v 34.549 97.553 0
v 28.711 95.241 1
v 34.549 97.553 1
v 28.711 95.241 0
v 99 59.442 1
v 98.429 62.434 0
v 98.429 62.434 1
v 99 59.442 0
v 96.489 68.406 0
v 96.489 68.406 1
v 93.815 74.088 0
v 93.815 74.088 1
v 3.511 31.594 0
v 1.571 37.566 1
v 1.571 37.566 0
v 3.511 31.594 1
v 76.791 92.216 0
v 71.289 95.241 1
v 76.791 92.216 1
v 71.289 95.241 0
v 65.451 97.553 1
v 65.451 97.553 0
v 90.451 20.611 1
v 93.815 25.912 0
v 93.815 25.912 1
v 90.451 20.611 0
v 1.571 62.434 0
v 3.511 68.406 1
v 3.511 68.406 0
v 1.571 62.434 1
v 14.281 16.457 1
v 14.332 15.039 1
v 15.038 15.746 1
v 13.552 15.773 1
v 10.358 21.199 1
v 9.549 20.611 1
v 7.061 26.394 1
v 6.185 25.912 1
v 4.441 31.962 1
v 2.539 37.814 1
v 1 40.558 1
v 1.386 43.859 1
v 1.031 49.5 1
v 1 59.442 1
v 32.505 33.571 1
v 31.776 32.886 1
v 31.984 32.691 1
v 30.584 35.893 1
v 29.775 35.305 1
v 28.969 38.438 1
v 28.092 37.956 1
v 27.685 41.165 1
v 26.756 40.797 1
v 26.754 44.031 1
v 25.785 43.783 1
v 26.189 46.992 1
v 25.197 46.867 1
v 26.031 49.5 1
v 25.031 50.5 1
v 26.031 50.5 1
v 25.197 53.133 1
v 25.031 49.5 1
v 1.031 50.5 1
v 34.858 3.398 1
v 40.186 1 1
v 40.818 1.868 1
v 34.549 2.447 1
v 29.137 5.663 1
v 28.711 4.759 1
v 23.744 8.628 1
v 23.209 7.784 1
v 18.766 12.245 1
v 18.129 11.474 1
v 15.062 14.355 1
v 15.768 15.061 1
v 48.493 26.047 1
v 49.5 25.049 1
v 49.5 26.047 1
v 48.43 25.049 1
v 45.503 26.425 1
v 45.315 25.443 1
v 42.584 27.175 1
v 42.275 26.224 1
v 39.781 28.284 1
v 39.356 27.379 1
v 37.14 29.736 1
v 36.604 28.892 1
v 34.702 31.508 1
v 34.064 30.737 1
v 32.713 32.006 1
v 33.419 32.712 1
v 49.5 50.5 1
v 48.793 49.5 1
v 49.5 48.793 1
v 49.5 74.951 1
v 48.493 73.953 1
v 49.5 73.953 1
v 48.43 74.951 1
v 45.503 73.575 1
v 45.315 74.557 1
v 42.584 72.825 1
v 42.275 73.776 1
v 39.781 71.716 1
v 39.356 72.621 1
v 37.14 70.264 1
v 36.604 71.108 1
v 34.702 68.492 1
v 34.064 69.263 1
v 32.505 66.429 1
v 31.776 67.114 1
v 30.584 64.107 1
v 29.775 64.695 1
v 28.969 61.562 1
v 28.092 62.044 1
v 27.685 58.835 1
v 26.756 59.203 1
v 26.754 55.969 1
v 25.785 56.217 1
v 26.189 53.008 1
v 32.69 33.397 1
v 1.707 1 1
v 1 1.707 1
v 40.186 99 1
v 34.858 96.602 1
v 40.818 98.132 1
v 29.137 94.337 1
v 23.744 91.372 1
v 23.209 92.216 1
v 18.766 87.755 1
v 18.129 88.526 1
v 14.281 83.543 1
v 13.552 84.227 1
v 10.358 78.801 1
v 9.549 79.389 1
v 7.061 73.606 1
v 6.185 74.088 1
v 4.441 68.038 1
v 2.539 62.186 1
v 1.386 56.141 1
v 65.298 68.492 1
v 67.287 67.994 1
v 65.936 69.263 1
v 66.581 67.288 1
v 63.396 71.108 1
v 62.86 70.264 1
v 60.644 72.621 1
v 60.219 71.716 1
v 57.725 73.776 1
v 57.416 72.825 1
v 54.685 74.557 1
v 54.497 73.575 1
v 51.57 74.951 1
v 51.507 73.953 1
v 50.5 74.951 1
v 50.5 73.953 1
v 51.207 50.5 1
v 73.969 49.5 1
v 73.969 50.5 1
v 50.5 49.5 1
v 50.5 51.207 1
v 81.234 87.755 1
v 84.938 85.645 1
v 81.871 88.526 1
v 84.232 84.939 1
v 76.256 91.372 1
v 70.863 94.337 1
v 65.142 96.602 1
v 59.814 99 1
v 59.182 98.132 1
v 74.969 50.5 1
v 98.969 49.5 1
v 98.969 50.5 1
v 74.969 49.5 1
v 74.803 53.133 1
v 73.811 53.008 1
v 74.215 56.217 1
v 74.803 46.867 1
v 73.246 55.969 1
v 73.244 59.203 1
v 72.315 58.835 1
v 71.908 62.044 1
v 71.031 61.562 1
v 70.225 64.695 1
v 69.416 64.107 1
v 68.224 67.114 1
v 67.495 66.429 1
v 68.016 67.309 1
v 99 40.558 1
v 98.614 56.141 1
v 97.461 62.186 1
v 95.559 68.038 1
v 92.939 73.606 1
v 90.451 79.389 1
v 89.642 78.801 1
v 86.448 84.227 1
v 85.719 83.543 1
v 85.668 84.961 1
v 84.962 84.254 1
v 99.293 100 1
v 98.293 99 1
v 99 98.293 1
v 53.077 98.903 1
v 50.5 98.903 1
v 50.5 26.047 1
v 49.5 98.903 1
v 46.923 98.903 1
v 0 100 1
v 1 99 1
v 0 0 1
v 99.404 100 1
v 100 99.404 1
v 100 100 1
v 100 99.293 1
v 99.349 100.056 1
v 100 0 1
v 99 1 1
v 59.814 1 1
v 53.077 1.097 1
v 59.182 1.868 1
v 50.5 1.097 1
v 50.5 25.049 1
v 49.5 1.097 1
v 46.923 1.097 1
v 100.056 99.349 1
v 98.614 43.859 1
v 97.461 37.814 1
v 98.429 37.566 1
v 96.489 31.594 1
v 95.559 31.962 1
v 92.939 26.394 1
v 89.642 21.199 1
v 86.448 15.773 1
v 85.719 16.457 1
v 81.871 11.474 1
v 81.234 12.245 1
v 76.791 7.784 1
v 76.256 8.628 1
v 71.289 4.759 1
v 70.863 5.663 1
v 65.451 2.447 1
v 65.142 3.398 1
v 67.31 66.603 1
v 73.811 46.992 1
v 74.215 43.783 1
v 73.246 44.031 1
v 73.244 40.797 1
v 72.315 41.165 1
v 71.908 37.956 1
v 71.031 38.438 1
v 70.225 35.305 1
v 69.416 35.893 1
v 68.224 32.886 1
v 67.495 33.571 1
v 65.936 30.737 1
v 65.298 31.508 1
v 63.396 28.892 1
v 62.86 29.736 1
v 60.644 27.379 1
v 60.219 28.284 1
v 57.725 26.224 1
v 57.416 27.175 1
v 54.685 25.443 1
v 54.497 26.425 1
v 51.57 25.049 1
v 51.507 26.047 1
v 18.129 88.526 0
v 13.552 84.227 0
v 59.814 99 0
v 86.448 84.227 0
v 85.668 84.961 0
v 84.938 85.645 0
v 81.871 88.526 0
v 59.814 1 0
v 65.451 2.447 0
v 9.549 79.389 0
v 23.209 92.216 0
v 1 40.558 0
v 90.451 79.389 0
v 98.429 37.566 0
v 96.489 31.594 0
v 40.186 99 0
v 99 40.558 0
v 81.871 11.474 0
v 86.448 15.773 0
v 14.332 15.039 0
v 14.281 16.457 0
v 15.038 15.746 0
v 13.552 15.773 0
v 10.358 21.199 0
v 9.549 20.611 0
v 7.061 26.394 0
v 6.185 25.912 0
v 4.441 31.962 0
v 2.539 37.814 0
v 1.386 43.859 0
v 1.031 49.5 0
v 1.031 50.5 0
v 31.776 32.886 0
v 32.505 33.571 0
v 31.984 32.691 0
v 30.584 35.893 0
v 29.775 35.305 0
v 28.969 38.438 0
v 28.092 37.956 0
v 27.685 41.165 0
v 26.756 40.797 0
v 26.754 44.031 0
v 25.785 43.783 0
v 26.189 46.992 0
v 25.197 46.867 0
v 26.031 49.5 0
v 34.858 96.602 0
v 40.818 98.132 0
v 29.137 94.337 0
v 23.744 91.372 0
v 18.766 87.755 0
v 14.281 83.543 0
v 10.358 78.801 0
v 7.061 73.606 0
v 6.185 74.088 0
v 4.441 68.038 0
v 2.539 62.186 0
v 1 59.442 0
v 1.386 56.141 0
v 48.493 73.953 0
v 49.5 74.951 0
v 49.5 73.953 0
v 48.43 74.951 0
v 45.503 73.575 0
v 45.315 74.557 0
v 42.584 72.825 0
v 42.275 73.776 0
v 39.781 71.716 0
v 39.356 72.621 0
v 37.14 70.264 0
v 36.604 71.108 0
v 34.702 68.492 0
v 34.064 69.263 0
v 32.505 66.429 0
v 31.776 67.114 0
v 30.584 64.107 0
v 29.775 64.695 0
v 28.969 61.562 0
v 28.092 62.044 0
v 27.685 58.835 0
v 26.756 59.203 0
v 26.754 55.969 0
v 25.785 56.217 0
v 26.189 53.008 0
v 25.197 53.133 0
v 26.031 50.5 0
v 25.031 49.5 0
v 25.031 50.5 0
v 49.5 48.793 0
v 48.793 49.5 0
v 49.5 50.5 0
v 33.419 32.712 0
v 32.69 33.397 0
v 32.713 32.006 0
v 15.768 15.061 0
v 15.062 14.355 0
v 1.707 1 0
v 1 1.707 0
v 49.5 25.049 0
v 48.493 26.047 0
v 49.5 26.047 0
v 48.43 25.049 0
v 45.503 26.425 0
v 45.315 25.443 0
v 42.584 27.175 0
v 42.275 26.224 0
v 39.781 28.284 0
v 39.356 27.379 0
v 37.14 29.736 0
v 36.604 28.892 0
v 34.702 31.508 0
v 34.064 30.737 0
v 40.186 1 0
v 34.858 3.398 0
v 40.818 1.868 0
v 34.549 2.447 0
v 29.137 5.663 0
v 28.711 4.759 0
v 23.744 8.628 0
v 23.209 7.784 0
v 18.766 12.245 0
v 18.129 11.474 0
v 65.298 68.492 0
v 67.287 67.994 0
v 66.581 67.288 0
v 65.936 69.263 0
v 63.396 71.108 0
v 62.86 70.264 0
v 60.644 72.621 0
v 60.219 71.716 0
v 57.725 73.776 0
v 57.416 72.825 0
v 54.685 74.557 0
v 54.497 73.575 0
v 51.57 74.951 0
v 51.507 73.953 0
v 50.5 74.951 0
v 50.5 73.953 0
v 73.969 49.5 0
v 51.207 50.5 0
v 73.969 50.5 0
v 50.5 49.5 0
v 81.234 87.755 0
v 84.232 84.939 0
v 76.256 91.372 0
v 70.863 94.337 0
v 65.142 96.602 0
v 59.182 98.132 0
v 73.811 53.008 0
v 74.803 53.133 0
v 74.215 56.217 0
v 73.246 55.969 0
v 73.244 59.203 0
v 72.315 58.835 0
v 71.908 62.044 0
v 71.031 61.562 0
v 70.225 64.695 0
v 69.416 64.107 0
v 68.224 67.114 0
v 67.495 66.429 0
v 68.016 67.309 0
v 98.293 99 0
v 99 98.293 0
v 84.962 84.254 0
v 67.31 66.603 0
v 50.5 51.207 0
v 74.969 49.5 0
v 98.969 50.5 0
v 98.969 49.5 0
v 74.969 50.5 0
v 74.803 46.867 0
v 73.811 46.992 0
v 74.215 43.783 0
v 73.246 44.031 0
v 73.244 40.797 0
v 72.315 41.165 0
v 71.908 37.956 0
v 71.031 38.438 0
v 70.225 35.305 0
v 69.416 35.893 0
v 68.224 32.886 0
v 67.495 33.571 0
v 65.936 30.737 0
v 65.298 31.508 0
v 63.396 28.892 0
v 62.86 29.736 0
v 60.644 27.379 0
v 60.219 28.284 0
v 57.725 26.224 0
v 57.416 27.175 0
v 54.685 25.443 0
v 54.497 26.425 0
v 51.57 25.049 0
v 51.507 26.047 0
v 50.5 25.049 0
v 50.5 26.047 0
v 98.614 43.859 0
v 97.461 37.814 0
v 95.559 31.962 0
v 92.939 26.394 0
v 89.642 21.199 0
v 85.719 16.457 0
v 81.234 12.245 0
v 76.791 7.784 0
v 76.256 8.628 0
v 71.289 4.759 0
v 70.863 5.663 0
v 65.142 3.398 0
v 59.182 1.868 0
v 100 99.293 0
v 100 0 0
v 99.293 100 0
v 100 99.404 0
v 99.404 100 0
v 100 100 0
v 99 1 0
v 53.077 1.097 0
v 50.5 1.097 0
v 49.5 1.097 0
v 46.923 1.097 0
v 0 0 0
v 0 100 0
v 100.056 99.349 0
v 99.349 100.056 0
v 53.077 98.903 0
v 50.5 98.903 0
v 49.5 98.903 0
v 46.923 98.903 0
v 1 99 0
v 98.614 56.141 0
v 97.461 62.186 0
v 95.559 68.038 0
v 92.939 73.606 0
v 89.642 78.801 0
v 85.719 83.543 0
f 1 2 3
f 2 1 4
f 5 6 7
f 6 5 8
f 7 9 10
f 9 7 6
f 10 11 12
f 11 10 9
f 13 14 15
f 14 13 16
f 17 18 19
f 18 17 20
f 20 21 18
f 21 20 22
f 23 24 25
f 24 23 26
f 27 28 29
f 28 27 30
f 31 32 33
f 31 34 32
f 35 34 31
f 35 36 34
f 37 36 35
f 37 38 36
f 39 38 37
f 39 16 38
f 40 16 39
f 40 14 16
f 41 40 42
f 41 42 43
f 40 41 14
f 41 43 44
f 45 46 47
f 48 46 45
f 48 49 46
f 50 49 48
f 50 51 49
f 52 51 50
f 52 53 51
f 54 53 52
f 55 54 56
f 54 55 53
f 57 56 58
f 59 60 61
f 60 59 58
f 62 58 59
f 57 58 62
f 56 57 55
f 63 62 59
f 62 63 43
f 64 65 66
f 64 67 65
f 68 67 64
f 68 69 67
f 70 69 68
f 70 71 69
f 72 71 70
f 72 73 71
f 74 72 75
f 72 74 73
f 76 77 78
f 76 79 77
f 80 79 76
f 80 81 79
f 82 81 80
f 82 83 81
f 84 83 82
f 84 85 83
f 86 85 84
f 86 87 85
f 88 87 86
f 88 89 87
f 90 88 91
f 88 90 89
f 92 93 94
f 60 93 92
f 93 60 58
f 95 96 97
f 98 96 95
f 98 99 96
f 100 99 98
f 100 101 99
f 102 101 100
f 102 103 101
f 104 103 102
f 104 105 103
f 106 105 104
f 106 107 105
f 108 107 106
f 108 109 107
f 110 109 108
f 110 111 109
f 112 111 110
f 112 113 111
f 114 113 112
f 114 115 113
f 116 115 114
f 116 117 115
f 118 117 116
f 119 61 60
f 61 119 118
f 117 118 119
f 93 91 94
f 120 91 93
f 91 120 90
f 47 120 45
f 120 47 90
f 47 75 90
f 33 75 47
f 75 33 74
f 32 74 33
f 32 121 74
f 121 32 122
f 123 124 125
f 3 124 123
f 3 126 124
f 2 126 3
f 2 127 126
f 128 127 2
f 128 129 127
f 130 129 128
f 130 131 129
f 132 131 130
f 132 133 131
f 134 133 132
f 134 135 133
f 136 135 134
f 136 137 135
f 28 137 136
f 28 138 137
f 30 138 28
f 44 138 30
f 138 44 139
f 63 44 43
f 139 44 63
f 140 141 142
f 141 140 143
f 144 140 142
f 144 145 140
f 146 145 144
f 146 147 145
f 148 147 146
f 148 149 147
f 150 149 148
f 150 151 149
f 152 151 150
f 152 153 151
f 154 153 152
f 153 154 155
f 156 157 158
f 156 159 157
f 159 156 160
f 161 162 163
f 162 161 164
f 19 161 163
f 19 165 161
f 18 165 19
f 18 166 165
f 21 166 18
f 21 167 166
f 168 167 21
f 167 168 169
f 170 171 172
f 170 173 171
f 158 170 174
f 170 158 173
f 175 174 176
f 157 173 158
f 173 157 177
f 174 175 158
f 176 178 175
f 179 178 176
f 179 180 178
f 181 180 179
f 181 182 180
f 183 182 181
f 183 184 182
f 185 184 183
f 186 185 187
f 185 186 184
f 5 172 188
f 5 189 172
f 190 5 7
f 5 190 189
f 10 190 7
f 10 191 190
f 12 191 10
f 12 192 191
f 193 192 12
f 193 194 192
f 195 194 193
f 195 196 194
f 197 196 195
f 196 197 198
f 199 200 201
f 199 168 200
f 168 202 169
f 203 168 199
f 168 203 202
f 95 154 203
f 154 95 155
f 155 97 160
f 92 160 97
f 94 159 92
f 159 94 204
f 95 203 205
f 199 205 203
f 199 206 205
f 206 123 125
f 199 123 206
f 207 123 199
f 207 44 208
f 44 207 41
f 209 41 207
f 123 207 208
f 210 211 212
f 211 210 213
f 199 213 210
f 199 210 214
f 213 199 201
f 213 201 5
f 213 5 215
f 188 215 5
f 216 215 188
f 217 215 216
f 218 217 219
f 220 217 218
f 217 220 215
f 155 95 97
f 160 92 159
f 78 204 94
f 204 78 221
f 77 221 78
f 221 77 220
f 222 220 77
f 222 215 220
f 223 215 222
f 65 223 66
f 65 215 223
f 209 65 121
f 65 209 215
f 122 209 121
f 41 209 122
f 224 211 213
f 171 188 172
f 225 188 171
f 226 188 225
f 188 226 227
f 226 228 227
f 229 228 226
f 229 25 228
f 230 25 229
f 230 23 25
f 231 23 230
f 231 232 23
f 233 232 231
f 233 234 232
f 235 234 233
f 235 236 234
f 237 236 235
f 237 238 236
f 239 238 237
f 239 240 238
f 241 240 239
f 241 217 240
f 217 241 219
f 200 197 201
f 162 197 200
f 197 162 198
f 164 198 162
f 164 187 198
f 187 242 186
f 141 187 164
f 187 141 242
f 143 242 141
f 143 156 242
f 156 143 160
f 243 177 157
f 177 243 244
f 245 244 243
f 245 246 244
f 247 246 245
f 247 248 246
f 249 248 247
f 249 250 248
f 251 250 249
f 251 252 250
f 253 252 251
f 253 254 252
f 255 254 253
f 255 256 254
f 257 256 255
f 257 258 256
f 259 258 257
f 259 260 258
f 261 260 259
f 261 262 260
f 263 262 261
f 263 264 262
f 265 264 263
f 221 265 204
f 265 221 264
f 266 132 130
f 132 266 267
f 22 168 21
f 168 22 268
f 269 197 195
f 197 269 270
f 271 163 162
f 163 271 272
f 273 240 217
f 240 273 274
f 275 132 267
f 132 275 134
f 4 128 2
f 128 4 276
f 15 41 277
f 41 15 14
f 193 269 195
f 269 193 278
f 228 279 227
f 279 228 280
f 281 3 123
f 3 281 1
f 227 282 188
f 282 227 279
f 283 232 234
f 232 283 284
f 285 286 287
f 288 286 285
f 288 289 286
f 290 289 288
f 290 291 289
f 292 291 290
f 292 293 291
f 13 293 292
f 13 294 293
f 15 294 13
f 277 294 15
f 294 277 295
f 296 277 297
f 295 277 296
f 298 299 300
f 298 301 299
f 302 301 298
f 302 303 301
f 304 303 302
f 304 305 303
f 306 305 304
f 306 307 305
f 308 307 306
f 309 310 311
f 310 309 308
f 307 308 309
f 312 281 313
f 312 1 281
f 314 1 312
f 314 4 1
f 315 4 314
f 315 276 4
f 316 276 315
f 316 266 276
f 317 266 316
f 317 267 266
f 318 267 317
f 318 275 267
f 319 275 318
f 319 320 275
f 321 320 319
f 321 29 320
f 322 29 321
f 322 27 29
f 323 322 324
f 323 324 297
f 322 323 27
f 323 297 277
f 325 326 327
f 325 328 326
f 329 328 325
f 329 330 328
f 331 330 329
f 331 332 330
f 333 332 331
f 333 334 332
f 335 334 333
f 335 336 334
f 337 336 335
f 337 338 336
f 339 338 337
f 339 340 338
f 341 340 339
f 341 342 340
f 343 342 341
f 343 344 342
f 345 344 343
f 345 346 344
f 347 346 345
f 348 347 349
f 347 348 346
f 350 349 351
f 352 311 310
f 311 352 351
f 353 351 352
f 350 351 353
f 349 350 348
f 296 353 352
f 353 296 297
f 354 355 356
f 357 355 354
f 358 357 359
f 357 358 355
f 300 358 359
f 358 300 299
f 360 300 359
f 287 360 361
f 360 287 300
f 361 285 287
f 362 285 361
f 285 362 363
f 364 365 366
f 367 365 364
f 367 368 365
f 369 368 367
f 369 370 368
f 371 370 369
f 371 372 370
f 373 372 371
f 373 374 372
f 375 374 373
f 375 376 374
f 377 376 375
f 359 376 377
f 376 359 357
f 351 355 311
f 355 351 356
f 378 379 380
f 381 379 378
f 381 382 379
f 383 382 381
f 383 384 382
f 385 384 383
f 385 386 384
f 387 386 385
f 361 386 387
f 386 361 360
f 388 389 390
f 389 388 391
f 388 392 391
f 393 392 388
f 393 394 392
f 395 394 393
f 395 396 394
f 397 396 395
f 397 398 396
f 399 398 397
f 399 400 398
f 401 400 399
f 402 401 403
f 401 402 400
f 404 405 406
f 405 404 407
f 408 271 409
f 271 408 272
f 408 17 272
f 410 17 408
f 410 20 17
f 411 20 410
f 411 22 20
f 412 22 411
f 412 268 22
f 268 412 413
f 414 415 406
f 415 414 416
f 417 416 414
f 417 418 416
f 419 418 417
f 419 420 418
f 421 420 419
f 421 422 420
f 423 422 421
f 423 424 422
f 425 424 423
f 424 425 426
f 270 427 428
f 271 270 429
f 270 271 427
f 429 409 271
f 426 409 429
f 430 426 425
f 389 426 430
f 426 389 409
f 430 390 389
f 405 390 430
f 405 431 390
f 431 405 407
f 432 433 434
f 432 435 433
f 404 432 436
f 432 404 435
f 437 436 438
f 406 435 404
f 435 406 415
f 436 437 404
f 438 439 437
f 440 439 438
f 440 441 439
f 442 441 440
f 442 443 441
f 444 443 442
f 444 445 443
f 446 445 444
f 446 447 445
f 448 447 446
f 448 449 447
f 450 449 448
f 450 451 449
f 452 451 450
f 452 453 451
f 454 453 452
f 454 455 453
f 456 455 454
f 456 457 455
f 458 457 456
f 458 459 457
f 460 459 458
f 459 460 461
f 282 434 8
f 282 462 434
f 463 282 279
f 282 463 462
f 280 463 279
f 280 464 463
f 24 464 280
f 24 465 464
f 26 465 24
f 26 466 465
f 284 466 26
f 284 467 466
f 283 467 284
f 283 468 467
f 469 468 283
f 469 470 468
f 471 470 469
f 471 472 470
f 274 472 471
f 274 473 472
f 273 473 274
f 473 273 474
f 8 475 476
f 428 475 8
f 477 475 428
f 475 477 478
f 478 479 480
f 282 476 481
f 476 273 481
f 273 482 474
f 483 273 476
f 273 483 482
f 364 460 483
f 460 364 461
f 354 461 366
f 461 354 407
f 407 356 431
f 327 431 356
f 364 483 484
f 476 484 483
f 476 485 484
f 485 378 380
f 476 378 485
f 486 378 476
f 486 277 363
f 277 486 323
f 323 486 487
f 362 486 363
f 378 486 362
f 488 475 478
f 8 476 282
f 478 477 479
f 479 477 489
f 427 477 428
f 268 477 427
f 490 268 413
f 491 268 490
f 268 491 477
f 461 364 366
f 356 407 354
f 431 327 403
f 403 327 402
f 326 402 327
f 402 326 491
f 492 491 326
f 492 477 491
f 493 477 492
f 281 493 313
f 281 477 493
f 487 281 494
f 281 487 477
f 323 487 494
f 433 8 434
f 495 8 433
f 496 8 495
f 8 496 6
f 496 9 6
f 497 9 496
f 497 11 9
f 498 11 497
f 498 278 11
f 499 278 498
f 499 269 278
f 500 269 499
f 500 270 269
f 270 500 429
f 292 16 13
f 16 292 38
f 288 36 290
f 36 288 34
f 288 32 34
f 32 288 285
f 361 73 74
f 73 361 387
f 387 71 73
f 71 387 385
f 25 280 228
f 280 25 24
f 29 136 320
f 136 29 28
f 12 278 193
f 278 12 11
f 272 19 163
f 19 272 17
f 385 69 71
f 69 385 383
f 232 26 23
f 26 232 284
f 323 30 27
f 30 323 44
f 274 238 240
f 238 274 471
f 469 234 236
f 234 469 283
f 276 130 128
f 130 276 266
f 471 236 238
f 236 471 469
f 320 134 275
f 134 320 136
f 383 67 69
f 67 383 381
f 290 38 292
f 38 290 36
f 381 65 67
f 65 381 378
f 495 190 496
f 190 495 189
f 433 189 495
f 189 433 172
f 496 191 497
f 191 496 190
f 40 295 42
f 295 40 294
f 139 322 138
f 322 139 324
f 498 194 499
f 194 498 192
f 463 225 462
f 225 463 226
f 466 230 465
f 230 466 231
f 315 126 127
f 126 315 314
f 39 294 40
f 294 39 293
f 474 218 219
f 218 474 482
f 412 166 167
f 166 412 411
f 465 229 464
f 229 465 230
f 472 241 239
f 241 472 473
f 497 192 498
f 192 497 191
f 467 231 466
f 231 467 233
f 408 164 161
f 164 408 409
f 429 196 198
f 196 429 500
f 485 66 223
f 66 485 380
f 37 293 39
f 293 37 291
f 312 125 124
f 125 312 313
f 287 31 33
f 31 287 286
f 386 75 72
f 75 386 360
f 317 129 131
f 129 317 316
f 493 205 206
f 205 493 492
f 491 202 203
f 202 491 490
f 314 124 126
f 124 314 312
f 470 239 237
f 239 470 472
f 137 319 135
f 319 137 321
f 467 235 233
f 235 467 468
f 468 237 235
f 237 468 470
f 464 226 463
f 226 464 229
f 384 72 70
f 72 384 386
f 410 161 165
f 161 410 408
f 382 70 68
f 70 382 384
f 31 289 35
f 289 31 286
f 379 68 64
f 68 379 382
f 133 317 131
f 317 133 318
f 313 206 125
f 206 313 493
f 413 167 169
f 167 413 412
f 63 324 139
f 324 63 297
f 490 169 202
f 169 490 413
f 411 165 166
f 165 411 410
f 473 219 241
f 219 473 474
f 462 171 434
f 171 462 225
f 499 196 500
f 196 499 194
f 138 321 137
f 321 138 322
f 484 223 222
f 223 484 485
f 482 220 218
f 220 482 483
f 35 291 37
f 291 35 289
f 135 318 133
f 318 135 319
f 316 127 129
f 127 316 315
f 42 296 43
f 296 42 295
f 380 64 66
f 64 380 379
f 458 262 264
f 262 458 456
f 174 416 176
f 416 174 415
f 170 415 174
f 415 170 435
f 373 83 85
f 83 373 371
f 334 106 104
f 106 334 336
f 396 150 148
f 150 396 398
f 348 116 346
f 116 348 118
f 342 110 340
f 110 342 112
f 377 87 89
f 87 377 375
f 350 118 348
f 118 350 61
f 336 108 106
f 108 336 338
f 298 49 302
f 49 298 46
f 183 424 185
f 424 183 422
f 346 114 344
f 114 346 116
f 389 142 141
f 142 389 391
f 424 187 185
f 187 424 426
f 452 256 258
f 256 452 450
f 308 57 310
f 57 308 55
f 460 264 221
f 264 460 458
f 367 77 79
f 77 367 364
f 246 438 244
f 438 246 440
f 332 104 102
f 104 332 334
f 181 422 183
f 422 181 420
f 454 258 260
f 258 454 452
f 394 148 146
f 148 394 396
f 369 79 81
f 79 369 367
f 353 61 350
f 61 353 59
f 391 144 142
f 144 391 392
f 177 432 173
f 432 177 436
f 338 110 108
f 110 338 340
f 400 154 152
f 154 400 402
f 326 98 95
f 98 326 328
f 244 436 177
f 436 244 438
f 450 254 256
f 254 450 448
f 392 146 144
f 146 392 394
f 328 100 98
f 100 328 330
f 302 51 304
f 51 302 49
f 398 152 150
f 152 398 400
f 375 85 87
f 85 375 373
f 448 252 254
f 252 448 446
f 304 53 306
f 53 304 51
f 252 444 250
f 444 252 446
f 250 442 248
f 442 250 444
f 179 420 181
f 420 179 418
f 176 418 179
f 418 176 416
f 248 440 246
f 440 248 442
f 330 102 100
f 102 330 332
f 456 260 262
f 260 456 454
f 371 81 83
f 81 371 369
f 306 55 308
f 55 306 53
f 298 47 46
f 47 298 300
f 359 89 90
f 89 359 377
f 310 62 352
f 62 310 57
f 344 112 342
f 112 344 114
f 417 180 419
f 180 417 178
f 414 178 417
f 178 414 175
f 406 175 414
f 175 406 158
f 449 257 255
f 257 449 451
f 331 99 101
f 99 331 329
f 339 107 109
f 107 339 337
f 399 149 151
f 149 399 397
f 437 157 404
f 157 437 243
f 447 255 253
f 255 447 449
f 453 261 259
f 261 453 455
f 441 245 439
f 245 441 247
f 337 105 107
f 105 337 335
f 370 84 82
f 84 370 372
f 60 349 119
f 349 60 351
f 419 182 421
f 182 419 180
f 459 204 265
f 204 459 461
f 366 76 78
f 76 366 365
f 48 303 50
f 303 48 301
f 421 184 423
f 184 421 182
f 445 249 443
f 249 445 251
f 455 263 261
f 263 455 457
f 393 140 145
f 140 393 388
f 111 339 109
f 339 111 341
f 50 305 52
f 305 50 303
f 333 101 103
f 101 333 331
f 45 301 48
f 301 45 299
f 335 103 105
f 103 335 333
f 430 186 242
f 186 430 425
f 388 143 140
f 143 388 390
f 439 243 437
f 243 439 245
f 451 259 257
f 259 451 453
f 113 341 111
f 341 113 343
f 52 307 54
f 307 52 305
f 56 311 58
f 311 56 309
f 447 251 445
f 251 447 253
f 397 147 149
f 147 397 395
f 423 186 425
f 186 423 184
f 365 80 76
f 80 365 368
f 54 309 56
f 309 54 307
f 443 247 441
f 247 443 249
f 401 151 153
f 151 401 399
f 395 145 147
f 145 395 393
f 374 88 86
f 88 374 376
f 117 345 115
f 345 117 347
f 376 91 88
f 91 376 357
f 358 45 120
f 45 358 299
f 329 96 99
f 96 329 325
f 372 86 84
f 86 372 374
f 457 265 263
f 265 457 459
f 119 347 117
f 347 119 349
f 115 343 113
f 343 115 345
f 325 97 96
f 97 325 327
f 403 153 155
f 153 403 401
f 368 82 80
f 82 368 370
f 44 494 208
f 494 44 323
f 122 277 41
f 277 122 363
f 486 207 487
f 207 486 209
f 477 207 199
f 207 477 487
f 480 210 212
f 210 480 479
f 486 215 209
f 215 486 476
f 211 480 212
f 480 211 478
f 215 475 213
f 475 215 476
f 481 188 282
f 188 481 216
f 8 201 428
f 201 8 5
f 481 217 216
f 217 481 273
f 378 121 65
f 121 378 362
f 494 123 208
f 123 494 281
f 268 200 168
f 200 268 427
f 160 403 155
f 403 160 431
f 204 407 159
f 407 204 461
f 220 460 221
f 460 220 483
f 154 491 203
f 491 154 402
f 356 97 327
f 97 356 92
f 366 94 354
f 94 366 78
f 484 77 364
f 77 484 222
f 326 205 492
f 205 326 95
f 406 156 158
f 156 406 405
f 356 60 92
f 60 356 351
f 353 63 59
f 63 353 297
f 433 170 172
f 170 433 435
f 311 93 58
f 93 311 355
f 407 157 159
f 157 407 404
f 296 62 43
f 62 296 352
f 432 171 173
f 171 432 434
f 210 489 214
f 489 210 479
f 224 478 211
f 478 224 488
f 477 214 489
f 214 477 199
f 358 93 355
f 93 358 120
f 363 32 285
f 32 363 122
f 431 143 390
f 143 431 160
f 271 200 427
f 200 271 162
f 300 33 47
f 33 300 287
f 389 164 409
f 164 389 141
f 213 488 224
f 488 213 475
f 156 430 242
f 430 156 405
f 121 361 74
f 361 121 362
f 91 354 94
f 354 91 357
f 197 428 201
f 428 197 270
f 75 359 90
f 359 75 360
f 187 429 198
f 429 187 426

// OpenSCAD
L = 100;
w = 1;
h1 = 1;
h1p = h1+0.02;
Lm = L - 2 * w;

L1 = L / 2;

$fn=50;

union() {
  
  // outer border
  translate([0,0,0]) cube([w,L,h1]);
  translate([ L-w,0,0]) cube([w,L,h1]);
  translate([0,0,0]) cube([L,w,h1]);
  translate([0, L-w,0]) cube([L,w,h1]);
  
  // central cross
  translate([L1-w/2,0,0]) cube([w,L,h1]);
  translate([0,L1-w/2,0]) cube([L,w,h1]);
  
  rotate([0,0,45]) translate([w,-w/2,0]) cube([L*1.41-w,w,h1]);
  
  difference() {
    translate([L1,L1,0]) cylinder(h=h1,d=L);
    translate([L1,L1,0]) cylinder(h=h1p,d=L-2*w);
  }
  difference() {
    translate([L1,L1,0]) cylinder(h=h1,d=L1);
    translate([L1,L1,0]) cylinder(h=h1p,d=L1-2*w);
  }    
    

}
